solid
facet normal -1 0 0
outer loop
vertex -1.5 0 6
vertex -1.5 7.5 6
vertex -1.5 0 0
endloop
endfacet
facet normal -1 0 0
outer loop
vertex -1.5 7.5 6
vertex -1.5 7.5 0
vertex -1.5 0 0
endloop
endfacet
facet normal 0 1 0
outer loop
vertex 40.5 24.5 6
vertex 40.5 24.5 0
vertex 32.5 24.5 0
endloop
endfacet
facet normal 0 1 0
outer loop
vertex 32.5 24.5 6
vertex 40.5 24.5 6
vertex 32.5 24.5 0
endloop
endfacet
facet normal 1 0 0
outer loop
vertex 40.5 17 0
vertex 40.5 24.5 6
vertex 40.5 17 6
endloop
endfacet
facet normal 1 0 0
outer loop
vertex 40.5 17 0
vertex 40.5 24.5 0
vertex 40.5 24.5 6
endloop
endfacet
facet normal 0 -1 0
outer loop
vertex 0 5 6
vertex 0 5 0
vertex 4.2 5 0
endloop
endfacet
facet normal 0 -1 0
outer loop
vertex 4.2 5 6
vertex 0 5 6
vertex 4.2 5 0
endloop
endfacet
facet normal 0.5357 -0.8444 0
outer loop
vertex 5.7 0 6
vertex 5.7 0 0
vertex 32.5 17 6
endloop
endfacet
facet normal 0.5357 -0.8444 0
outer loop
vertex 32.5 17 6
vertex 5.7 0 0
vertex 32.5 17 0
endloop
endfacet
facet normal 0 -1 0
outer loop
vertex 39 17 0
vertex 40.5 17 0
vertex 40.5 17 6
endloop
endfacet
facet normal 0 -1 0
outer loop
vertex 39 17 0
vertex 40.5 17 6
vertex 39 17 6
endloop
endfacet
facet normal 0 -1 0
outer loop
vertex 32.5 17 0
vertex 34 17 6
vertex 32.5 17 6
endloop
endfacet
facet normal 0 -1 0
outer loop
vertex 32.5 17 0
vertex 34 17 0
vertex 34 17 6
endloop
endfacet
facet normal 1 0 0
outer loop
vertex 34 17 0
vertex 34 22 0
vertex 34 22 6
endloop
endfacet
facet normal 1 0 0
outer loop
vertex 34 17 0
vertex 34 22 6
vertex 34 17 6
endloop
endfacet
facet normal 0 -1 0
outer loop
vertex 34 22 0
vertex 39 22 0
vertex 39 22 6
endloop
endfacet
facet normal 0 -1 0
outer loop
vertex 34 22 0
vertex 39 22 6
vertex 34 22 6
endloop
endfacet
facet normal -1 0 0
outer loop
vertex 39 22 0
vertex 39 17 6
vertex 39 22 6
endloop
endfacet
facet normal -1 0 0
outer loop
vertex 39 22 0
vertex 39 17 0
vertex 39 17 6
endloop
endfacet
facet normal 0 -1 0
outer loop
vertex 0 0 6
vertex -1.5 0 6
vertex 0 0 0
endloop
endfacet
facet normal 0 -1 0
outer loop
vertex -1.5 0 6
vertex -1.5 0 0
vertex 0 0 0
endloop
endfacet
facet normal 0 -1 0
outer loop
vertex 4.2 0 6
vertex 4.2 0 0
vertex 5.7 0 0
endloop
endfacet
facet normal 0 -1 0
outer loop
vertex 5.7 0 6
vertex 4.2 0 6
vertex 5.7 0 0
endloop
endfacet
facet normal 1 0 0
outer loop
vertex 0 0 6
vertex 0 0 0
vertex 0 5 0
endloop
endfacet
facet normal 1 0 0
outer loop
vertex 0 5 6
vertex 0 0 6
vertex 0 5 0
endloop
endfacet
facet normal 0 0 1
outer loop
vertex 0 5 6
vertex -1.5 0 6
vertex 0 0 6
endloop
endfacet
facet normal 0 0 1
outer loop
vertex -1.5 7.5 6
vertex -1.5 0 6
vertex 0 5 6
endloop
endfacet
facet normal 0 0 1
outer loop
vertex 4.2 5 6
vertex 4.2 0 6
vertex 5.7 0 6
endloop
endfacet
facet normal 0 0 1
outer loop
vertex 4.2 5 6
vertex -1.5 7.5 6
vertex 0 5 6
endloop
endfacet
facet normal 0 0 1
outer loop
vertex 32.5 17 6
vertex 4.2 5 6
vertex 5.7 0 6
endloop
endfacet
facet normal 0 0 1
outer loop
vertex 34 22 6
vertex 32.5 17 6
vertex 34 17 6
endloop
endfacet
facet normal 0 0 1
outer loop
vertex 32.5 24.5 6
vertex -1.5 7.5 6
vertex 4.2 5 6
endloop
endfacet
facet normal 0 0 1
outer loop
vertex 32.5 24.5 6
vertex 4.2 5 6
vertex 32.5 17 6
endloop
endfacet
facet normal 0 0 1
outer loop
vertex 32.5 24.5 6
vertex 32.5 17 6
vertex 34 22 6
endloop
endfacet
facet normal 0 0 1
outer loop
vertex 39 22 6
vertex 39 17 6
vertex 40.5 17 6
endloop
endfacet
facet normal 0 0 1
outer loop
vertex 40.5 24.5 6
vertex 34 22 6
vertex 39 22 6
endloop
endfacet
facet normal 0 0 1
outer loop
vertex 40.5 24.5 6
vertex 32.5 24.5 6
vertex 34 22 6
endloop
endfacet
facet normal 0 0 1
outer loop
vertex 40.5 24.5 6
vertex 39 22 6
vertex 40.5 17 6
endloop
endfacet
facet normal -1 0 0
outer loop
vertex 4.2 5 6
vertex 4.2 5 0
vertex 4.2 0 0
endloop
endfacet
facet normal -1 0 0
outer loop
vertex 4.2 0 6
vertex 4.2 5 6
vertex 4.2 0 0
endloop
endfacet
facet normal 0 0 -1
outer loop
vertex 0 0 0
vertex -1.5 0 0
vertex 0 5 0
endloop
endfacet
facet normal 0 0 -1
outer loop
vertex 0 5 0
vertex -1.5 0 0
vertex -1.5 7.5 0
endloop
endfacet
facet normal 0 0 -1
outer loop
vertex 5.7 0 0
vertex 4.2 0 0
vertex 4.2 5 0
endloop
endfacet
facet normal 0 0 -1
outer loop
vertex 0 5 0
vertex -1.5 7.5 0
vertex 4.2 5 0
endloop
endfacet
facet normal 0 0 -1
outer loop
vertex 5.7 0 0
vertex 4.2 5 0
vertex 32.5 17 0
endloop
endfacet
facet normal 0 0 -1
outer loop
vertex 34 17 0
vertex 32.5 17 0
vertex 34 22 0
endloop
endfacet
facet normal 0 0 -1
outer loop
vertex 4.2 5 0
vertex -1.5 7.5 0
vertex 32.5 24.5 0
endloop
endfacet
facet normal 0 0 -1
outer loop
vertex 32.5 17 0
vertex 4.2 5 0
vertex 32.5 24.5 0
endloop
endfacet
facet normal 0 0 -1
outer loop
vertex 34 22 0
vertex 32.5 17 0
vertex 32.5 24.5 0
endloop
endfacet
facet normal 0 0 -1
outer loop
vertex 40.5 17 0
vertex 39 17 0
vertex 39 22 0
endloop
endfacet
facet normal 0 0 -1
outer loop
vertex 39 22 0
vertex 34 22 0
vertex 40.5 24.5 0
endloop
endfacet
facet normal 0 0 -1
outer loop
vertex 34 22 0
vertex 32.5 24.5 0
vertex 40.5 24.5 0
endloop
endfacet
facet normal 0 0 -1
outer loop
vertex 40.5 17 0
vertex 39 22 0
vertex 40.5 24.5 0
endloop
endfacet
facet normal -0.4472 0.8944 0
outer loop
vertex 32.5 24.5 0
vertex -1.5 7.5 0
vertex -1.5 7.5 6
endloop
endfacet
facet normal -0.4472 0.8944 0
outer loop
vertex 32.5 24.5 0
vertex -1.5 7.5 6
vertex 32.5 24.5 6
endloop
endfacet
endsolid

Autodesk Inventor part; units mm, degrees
ref_plane "YZ Plane" through (0, 0, 0) normal (1, 0, 0) x (0, 1, 0)
ref_plane "XZ Plane" through (0, 0, 0) normal (0, 1, 0) x (-1, 0, 0)
ref_plane "XY Plane" through (0, 0, 0) normal (0, 0, 1) x (1, 0, 0)
sketch "Sketch1" plane through (0, 0, 0) normal (0, 0, 1) x (1, 0, 0)
  line L0 (0, 0) -> (0, 5)
  line L1 (0, 5) -> (4.2, 5)
  line L2 (4.2, 5) -> (4.2, 0)
  line L3 (4.2, 0) -> (5.7, 0)
  line L4 (-1.5, 7.5) -> (-1.5, 0)
  line L5 (-1.5, 0) -> (0, 0)
  line L6 (40.5, 24.5) -> (40.5, 17)
  line L7 (40.5, 17) -> (39, 17)
  line L8 (39, 17) -> (39, 22)
  line L9 (39, 22) -> (34, 22)
  line L10 (34, 22) -> (34, 17)
  line L11 (34, 17) -> (32.5, 17)
  line L12 (40.5, 24.5) -> (32.5, 24.5)
  line L13 (32.5, 17) -> (32.5, 24.5)
  line L14 (-1.5, 7.5) -> (5.7, 7.5)
  line L15 (5.7, 0) -> (5.7, 7.5)
  line L16 (-1.5, 7.5) -> (32.5, 24.5)
  line L17 (5.7, 0) -> (32.5, 17)
  dimension "d0" = 17
  dimension "d1" = 5
  dimension "d2" = 4.2
  dimension "d4" = 1.5
  dimension "d5" = 1.5
  dimension "d7" = 5
  dimension "d8" = 5
  dimension "d9" = 2.5
  dimension "d10" = 2.5
  dimension "d11" = 34
extrude "Extrusion1" add sketch "Sketch1" along normal blind 6
properties part number "StrumArm"
